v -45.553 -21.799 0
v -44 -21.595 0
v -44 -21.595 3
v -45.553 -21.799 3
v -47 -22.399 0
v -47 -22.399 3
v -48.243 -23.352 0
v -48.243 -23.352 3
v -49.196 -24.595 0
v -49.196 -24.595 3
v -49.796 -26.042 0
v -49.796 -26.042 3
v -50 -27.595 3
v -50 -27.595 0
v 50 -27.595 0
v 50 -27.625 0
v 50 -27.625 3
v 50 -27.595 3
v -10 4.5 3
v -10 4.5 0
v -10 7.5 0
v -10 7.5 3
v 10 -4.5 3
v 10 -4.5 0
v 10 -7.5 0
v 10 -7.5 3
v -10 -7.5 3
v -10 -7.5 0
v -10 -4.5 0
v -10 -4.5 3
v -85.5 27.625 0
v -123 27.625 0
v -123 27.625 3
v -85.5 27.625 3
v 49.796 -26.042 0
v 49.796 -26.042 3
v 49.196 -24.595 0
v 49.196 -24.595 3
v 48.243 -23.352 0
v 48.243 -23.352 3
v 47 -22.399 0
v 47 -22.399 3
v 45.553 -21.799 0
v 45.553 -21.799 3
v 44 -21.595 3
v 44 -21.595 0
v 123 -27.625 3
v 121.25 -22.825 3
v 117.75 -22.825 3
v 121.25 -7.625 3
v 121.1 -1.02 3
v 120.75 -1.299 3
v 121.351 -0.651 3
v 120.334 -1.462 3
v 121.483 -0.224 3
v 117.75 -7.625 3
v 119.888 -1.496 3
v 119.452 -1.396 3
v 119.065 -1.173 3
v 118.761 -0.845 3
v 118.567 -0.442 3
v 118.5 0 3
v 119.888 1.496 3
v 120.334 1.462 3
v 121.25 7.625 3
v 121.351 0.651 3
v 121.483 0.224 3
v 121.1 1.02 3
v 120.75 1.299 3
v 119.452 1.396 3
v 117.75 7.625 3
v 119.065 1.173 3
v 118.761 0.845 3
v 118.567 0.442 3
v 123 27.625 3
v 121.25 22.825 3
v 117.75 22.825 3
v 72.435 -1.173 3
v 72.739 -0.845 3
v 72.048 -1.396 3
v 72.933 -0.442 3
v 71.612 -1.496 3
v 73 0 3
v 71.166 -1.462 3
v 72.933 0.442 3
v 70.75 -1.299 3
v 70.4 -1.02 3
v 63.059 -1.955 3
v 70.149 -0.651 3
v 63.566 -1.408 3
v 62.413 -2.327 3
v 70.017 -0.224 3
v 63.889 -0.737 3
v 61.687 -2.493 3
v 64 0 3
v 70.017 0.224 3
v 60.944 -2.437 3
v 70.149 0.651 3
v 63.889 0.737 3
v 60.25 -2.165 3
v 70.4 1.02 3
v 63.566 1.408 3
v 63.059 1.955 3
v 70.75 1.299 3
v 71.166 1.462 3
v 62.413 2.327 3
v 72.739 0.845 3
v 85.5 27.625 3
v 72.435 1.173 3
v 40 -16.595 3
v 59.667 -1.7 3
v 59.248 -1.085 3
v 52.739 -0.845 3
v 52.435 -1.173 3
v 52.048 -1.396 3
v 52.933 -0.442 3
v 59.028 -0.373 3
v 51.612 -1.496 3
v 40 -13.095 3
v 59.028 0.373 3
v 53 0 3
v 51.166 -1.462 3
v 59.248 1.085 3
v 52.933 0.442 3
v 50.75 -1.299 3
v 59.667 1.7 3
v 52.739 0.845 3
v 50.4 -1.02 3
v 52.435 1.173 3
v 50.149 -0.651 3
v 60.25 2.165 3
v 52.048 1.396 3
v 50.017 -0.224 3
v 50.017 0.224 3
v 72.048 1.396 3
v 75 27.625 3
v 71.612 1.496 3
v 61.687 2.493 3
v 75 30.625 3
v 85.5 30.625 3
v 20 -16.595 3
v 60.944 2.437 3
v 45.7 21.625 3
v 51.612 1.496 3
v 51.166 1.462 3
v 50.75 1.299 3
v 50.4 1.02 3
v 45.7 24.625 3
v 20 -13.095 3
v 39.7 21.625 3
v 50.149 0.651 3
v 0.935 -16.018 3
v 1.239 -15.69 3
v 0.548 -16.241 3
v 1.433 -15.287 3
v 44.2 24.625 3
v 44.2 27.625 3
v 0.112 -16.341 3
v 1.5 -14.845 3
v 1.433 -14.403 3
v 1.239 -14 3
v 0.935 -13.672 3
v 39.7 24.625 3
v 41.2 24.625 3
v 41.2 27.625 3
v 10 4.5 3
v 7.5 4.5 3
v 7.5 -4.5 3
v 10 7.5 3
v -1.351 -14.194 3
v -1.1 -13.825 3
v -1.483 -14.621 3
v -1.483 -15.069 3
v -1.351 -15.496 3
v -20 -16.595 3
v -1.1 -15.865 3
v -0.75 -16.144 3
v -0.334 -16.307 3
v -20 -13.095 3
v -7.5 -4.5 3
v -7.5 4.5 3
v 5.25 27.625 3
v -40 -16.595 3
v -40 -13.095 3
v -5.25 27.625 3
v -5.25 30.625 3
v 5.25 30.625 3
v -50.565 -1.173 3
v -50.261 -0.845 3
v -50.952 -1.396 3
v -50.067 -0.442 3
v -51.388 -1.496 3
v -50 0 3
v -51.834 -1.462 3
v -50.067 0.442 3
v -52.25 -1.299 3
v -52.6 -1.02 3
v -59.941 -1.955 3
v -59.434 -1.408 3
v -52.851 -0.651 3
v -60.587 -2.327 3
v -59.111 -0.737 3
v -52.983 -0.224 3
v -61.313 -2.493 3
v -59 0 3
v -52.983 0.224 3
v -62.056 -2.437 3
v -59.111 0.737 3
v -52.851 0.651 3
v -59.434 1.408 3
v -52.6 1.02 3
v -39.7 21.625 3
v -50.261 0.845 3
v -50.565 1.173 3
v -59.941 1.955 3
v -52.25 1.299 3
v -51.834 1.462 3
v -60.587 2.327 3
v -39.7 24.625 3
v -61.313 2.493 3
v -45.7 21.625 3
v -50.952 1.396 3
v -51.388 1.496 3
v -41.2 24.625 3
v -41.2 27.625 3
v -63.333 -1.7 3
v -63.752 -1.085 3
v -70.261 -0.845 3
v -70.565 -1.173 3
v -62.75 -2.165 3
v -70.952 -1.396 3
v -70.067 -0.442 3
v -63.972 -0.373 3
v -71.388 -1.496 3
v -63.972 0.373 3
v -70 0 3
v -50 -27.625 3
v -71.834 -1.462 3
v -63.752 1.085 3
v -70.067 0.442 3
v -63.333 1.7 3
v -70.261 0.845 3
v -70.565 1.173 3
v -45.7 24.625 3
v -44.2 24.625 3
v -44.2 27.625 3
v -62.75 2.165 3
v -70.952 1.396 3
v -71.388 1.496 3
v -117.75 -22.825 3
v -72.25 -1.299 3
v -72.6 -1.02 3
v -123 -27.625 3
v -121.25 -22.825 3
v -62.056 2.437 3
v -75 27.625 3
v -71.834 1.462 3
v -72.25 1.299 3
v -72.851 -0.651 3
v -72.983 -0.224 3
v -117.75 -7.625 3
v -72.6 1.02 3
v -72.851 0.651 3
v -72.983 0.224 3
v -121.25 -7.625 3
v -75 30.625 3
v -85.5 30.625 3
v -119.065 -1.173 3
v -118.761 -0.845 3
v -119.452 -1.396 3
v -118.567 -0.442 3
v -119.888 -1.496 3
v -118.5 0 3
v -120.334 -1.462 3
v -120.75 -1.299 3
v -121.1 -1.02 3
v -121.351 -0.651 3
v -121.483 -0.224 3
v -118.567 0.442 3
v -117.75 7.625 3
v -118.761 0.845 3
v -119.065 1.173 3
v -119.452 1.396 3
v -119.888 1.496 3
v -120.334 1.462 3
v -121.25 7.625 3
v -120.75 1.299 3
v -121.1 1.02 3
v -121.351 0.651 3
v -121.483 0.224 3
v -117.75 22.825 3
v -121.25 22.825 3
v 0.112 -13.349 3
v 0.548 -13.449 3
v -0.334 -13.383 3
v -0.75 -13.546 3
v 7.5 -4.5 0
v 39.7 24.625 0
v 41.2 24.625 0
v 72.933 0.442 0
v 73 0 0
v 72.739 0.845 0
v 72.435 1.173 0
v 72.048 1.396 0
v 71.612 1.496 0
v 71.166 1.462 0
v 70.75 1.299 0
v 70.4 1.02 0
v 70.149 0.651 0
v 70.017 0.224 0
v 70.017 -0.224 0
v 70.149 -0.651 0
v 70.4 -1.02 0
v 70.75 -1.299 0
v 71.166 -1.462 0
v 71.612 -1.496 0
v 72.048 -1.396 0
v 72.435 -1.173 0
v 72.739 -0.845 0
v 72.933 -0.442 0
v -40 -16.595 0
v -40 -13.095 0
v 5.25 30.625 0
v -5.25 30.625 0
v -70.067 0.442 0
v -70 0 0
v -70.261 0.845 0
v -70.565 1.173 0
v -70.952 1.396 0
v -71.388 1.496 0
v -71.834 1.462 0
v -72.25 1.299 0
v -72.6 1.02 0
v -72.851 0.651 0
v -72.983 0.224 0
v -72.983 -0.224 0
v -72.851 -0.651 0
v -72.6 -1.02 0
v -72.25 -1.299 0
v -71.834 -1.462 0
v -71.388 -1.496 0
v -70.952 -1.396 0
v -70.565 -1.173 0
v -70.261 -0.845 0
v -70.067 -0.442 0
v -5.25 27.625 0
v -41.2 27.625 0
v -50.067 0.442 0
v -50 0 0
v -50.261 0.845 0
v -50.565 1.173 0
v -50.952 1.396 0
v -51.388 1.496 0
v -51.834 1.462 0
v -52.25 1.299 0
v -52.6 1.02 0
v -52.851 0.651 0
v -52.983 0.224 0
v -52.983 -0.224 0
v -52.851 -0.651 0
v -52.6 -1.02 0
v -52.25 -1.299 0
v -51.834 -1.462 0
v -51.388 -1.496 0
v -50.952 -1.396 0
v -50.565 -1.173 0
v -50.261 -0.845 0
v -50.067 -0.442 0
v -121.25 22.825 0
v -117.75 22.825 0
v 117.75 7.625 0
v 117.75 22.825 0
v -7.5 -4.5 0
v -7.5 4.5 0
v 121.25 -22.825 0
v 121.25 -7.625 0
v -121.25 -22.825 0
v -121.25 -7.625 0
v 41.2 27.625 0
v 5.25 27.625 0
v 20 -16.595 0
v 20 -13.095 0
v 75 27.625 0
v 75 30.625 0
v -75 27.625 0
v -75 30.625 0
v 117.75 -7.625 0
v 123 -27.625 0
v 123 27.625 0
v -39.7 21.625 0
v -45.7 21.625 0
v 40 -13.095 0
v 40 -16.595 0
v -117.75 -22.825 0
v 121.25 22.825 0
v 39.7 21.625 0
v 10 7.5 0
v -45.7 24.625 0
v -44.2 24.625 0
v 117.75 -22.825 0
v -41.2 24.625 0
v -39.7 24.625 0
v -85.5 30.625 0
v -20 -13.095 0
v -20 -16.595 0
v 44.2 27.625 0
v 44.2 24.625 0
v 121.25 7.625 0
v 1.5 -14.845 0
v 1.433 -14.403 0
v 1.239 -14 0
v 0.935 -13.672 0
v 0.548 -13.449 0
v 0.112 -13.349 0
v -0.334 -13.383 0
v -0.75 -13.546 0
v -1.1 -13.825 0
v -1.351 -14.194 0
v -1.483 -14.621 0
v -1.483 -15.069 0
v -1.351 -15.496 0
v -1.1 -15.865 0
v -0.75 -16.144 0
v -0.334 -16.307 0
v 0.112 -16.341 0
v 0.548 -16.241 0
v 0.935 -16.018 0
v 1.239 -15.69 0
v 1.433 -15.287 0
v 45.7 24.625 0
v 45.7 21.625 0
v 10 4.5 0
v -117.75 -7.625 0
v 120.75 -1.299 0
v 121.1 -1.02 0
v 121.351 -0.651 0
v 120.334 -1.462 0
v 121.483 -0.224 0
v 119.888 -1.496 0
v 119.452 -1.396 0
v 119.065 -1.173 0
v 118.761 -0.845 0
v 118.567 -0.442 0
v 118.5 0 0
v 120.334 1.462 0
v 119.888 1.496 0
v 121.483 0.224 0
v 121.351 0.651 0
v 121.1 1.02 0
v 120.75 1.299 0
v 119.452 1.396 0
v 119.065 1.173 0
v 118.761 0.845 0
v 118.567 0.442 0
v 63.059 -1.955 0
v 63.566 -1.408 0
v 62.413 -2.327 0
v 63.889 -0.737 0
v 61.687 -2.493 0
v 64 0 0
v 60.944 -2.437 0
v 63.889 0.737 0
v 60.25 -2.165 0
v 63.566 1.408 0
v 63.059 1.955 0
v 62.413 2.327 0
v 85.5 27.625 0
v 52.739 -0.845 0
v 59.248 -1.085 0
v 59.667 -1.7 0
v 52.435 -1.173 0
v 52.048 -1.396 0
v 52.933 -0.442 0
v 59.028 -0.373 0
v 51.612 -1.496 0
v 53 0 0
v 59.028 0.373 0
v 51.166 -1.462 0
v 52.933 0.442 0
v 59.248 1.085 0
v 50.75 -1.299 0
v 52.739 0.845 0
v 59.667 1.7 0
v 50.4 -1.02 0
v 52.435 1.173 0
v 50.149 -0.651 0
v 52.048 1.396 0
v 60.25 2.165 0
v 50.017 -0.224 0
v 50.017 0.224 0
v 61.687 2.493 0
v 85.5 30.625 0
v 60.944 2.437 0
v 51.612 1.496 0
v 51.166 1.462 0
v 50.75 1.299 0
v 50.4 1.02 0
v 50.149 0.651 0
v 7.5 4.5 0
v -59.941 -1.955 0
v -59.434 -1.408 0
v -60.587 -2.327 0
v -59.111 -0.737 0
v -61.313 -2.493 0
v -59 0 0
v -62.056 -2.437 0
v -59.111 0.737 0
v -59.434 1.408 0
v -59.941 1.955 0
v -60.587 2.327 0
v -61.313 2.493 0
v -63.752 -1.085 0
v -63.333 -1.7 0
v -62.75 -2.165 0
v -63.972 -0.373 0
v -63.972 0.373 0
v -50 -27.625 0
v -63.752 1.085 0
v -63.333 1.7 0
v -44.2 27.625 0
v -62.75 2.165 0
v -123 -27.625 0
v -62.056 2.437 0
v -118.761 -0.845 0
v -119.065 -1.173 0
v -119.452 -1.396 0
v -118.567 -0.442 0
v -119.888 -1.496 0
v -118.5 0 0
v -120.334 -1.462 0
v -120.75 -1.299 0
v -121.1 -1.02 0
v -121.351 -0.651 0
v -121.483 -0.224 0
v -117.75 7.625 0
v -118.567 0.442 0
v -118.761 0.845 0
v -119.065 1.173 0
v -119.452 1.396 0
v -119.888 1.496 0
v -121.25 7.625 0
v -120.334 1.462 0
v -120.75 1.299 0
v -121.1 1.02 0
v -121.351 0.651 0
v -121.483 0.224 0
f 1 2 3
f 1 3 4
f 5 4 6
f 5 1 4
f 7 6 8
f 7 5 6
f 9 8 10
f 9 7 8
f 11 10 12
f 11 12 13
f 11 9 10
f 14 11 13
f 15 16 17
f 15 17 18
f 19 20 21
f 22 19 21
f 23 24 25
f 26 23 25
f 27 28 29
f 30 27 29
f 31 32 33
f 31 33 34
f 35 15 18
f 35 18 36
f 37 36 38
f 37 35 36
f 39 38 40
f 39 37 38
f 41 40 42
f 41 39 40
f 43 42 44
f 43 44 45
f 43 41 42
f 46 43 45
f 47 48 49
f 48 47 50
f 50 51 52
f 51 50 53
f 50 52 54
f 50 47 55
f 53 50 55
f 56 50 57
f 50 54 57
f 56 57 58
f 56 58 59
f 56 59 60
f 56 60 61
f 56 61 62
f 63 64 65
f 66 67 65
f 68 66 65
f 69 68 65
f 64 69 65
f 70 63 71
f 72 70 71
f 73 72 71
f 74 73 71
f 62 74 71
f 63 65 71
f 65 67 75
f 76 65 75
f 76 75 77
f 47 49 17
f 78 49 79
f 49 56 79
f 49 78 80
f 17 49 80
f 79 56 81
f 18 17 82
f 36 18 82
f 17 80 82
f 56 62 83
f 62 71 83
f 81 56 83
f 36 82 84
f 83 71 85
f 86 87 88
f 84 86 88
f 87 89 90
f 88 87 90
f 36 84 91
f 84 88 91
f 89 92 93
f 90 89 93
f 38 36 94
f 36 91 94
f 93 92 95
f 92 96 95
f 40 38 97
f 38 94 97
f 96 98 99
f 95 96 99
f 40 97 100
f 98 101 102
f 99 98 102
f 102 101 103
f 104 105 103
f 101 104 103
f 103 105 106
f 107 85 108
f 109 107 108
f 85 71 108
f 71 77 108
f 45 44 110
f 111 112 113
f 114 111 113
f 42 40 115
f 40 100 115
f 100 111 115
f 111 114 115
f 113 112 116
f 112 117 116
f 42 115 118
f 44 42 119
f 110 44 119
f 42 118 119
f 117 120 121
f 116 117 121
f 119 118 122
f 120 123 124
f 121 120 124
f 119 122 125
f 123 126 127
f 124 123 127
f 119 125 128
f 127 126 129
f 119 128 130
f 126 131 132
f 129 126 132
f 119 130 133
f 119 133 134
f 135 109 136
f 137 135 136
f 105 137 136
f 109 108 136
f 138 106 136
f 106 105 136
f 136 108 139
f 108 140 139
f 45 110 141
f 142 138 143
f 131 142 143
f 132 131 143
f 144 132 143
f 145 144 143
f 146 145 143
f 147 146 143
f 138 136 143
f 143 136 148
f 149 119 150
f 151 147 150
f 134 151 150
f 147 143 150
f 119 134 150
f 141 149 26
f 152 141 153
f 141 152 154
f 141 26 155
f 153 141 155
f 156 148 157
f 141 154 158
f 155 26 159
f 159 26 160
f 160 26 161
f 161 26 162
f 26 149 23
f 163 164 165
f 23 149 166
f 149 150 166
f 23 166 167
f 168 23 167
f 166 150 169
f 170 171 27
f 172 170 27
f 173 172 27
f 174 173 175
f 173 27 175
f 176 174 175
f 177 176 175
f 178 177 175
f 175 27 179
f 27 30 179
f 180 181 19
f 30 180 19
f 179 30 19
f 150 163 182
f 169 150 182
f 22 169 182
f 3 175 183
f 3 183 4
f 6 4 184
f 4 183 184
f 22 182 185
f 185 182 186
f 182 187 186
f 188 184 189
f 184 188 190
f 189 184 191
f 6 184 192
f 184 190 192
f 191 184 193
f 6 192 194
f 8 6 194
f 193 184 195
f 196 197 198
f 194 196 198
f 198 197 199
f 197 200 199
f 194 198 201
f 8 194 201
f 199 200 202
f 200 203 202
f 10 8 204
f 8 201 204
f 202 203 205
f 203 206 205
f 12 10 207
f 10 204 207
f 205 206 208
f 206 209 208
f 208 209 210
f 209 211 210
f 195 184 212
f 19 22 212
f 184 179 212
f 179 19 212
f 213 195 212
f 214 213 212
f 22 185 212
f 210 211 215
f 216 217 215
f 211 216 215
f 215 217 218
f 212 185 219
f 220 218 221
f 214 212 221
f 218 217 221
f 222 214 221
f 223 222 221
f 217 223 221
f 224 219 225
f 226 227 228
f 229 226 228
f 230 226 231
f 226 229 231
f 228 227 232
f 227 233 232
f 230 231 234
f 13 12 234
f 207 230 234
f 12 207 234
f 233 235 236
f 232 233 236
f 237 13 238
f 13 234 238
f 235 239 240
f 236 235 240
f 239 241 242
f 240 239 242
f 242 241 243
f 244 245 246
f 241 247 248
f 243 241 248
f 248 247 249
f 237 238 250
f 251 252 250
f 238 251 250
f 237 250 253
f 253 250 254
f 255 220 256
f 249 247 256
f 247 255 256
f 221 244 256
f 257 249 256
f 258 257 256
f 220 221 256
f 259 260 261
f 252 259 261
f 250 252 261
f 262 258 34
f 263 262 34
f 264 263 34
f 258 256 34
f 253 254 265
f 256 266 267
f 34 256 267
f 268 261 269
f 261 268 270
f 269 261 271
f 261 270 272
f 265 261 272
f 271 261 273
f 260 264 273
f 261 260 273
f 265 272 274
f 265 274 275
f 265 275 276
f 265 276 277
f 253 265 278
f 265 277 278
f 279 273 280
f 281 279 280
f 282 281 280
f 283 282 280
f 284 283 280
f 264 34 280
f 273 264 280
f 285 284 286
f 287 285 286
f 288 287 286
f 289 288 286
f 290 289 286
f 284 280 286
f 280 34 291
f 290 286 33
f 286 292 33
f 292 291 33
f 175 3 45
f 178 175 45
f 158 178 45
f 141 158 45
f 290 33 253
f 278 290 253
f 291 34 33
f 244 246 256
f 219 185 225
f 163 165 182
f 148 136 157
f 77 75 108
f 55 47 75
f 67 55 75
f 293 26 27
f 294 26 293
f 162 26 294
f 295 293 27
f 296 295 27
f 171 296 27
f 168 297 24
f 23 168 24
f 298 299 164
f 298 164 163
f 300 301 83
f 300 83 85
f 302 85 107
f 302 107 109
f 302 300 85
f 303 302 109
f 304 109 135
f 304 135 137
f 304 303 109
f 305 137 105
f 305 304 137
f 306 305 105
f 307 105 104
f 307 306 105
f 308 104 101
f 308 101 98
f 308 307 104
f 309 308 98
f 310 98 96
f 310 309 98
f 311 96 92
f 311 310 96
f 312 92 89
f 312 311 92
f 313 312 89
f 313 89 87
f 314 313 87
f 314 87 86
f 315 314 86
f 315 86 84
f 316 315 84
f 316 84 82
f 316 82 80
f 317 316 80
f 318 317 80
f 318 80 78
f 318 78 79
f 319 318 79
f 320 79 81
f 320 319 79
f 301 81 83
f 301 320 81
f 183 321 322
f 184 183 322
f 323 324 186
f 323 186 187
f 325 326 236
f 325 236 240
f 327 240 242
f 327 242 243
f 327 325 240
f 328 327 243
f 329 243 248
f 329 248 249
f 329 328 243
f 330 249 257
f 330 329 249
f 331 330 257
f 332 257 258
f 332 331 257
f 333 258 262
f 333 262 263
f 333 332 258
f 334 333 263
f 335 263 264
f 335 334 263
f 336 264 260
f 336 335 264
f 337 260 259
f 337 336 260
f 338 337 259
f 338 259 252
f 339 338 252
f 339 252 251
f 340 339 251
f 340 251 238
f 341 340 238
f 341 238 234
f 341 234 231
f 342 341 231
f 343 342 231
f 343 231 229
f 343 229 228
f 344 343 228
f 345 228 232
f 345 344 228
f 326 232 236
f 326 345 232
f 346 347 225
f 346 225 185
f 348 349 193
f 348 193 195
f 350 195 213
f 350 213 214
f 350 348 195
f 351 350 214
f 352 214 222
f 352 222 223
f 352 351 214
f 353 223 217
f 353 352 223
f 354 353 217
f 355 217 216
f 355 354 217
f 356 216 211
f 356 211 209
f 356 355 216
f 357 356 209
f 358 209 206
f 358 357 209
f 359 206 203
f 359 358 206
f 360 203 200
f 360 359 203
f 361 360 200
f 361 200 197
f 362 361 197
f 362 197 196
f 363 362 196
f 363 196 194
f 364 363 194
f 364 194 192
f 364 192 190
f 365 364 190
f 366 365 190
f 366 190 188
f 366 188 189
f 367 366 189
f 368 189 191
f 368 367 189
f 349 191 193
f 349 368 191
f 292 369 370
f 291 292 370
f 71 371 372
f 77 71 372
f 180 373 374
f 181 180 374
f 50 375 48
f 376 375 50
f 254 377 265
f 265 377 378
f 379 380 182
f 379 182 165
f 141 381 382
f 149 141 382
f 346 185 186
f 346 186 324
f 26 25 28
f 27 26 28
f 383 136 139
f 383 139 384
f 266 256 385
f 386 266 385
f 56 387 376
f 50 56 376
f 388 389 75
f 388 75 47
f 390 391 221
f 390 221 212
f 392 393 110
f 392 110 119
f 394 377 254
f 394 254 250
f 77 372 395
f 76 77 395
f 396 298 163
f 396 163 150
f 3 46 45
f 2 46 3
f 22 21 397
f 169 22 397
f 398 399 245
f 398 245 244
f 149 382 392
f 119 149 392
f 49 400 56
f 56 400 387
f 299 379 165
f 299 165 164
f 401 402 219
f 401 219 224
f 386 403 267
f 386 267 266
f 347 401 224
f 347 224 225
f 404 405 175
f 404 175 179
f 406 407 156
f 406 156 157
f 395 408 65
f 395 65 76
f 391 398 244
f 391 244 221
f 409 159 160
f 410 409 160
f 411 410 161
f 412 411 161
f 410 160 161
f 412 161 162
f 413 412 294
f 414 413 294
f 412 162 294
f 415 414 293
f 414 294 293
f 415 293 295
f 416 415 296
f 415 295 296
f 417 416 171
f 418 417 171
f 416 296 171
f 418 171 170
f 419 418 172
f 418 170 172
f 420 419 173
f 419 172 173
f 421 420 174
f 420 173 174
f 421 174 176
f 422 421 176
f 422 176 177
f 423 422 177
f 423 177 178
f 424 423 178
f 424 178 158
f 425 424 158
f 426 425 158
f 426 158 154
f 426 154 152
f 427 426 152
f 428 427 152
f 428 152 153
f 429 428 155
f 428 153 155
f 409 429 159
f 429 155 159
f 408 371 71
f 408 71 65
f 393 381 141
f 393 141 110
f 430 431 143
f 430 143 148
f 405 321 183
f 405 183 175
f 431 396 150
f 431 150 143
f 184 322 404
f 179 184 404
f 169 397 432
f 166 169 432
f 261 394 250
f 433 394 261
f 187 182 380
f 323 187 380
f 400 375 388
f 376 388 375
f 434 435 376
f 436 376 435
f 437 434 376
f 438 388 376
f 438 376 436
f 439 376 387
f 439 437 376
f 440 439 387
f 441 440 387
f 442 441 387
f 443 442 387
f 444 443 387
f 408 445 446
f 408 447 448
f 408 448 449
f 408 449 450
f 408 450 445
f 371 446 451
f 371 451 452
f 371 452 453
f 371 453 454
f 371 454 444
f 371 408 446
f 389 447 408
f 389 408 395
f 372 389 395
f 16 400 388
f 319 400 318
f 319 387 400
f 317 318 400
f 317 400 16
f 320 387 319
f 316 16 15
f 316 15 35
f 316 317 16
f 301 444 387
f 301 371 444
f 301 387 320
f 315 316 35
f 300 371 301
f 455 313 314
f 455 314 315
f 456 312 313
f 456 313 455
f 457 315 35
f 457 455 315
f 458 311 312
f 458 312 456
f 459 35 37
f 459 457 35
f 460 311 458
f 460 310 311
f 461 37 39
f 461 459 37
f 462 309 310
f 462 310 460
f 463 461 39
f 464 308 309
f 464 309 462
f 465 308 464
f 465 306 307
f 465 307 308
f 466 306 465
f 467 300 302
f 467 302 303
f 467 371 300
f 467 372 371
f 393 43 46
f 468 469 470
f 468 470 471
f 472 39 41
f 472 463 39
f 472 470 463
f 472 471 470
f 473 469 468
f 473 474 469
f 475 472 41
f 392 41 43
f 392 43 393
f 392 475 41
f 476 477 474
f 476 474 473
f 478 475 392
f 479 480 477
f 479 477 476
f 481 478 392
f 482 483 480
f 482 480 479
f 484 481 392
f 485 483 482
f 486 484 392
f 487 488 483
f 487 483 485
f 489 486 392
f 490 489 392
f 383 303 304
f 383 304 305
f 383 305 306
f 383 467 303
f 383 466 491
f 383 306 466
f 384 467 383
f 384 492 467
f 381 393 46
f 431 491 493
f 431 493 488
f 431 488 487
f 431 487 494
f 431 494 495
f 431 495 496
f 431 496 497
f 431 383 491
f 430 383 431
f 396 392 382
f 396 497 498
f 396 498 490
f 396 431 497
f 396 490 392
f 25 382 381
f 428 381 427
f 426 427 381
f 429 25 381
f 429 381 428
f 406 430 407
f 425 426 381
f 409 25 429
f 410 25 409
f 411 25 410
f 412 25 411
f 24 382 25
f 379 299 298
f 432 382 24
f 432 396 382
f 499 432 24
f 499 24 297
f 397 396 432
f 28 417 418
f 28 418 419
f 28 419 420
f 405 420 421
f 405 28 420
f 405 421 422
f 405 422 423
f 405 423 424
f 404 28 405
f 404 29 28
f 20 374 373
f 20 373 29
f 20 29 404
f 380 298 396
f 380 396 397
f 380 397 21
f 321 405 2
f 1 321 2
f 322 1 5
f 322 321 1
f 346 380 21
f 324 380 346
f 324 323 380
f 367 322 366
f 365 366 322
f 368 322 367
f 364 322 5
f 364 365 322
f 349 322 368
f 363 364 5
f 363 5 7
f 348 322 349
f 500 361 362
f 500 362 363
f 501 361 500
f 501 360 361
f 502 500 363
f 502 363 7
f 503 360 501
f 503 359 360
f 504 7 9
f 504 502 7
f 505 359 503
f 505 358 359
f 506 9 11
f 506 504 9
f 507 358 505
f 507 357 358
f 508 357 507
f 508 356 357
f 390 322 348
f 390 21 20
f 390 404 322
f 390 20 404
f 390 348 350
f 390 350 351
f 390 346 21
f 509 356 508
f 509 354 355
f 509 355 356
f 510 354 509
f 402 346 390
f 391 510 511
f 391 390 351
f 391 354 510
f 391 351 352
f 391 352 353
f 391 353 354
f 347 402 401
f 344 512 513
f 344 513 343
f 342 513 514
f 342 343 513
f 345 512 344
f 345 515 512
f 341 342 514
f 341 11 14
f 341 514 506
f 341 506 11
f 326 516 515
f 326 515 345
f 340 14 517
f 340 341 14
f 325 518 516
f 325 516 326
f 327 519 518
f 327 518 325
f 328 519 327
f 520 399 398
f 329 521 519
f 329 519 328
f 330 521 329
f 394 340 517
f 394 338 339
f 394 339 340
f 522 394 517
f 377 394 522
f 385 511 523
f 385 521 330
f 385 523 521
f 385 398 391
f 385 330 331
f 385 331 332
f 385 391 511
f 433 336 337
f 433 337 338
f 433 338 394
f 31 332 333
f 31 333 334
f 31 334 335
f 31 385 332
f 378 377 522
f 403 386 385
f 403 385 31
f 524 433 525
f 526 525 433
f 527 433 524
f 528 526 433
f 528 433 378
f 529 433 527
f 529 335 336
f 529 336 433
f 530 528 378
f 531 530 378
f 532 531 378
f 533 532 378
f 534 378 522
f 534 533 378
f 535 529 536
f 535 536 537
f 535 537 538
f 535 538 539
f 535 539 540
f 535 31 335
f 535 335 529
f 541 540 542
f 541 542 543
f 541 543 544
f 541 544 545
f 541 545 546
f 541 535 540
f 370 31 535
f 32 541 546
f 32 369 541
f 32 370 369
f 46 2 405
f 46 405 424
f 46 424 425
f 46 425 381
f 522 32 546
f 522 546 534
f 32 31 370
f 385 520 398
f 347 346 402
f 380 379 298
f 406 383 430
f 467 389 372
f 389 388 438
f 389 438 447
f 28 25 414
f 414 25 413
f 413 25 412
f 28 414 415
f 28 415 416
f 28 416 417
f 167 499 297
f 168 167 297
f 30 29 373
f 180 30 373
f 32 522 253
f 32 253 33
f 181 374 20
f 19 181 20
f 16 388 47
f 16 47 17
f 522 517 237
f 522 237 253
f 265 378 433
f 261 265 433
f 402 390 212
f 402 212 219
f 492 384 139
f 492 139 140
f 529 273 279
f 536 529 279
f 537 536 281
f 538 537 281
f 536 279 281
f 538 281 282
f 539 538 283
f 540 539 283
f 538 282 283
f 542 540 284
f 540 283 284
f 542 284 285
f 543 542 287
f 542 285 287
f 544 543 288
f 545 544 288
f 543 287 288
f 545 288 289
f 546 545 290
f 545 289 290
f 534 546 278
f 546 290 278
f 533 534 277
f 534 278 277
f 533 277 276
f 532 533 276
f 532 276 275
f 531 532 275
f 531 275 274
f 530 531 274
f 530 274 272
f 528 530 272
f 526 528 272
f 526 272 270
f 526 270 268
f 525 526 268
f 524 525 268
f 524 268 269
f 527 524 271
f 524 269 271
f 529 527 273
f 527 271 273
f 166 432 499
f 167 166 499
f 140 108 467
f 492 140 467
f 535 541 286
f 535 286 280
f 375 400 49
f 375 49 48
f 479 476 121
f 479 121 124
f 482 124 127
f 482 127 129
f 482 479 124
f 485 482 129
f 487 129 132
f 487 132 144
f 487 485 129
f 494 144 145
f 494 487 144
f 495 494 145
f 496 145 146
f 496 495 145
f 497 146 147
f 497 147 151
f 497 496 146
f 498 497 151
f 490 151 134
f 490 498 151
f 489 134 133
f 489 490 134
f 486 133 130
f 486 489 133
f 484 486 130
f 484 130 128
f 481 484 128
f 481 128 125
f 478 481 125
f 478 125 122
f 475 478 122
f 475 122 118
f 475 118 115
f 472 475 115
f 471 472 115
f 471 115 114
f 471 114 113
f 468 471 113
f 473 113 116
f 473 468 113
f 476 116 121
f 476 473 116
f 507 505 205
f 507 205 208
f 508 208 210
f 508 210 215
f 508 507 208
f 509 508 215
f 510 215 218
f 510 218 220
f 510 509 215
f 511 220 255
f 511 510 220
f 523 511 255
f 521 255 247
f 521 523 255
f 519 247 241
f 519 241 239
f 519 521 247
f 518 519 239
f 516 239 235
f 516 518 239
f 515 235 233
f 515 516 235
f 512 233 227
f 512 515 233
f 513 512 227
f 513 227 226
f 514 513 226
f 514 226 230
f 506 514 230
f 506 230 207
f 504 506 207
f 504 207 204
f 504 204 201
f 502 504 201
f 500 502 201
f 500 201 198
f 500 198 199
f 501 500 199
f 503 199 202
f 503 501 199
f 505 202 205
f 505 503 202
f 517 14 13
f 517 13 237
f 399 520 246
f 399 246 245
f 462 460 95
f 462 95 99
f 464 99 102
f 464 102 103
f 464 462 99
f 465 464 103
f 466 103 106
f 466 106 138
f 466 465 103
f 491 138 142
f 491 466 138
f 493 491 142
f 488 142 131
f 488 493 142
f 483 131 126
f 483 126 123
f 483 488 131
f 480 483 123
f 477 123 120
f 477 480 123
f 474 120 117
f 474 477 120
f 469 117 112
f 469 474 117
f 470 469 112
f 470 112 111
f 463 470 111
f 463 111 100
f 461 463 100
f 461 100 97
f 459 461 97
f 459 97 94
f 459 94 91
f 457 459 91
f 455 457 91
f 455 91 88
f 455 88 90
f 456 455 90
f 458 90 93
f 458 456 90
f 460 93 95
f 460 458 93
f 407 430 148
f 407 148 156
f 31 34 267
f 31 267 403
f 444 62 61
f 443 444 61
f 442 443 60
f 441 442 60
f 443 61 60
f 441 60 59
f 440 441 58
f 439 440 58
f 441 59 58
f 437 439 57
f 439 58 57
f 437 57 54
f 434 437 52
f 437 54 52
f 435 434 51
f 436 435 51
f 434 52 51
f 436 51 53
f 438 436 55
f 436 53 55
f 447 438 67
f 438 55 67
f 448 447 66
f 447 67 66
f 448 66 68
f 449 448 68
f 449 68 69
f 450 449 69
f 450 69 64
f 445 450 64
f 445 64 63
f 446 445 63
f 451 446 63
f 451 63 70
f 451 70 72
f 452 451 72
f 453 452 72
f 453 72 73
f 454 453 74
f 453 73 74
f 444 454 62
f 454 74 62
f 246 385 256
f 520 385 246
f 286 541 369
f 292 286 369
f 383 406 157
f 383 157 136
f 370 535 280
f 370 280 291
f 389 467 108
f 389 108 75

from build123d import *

# Parameters (mm, degrees)
CROQUIS1_R              = 2.5
CROQUIS1_R_2            = 1.5
CROQUIS1_W              = 20
CROQUIS1_H              = 3.5
CROQUIS1_W_2            = 3.5
CROQUIS1_H_2            = 15.2
SALIENTE_EXTRUIR1_DEPTH = 3
CROQUIS2_W              = 10.5
CROQUIS2_H              = 3
SALIENTE_EXTRUIR2_DEPTH = 3
CROQUIS3_R              = 1.5
CORTAR_EXTRUIR1_DEPTH   = 3
CROQUIS4_R              = 1.5
CORTAR_EXTRUIR2_DEPTH   = 3


with BuildPart() as part:
    # Croquis1 → Saliente-Extruir1 (new body)
    with BuildSketch(Plane.XY):
        with BuildLine():
            Line((123, -27.625), (50, -27.625))
            Line((50, -27.625), (50, -27.595))
            ThreePointArc((50, -27.595), (48.242640687, -23.352359313), (44, -21.595))
            Line((44, -21.595), (-44, -21.595))
            ThreePointArc((-44, -21.595), (-48.242640687, -23.352359313), (-50, -27.595))
            Line((-50, -27.595), (-50, -27.625))
            Line((-50, -27.625), (-123, -27.625))
            Line((-123, -27.625), (-123, 27.625))
            Line((-123, 27.625), (-44.2, 27.625))
            Line((-44.2, 27.625), (-44.2, 24.625))
            Line((-44.2, 24.625), (-45.7, 24.625))
            Line((-45.7, 24.625), (-45.7, 21.625))
            Line((-45.7, 21.625), (-39.7, 21.625))
            Line((-39.7, 21.625), (-39.7, 24.625))
            Line((-39.7, 24.625), (-41.2, 24.625))
            Line((-41.2, 24.625), (-41.2, 27.625))
            Line((-41.2, 27.625), (41.2, 27.625))
            Line((41.2, 27.625), (41.2, 24.625))
            Line((41.2, 24.625), (39.7, 24.625))
            Line((39.7, 24.625), (39.7, 21.625))
            Line((39.7, 21.625), (45.7, 21.625))
            Line((45.7, 21.625), (45.7, 24.625))
            Line((45.7, 24.625), (44.2, 24.625))
            Line((44.2, 24.625), (44.2, 27.625))
            Line((44.2, 27.625), (123, 27.625))
            Line((123, 27.625), (123, -27.625))
        make_face()
        with Locations((61.5, 0)):
            Circle(CROQUIS1_R, mode=Mode.SUBTRACT)
        with Locations((71.5, 0)):
            Circle(CROQUIS1_R_2, mode=Mode.SUBTRACT)
        with Locations((51.5, 0)):
            Circle(CROQUIS1_R_2, mode=Mode.SUBTRACT)
        with Locations((-71.5, 0)):
            Circle(CROQUIS1_R_2, mode=Mode.SUBTRACT)
        with Locations((-61.5, 0)):
            Circle(CROQUIS1_R, mode=Mode.SUBTRACT)
        with Locations((-51.5, 0)):
            Circle(CROQUIS1_R_2, mode=Mode.SUBTRACT)
        Polygon((-10, 7.5), (10, 7.5), (10, 4.5), (7.5, 4.5), (7.5, -4.5), (10, -4.5), (10, -7.5), (-10, -7.5), (-10, -4.5), (-7.5, -4.5), (-7.5, 4.5), (-10, 4.5), align=None, mode=Mode.SUBTRACT)
        with Locations((30, -14.845)):
            Rectangle(CROQUIS1_W, CROQUIS1_H, mode=Mode.SUBTRACT)
        with Locations((119.5, 15.225)):
            Rectangle(CROQUIS1_W_2, CROQUIS1_H_2, mode=Mode.SUBTRACT)
        with Locations((119.5, -15.225)):
            Rectangle(CROQUIS1_W_2, CROQUIS1_H_2, mode=Mode.SUBTRACT)
        with Locations((-119.5, 15.225)):
            Rectangle(CROQUIS1_W_2, CROQUIS1_H_2, mode=Mode.SUBTRACT)
        with Locations((-119.5, -15.225)):
            Rectangle(CROQUIS1_W_2, CROQUIS1_H_2, mode=Mode.SUBTRACT)
        with Locations((-30, -14.845)):
            Rectangle(CROQUIS1_W, CROQUIS1_H, mode=Mode.SUBTRACT)
    extrude(amount=SALIENTE_EXTRUIR1_DEPTH)

    # Croquis2 → Saliente-Extruir2 (add)
    with BuildSketch(Plane(origin=(0, 27.625, 0), x_dir=(1, 0, 0), z_dir=(0, 1, 0))):
        with Locations((0, -1.5)):
            Rectangle(CROQUIS2_W, CROQUIS2_H)
        with Locations((80.25, -1.5)):
            Rectangle(CROQUIS2_W, CROQUIS2_H)
        with Locations((-80.25, -1.5)):
            Rectangle(CROQUIS2_W, CROQUIS2_H)
    extrude(amount=SALIENTE_EXTRUIR2_DEPTH)

    # Croquis3 → Cortar-Extruir1 (cut)
    with BuildSketch(Plane.XY.offset(3)):
        with Locations((-120, 0)):
            Circle(CROQUIS3_R)
        with Locations(Location((120, 0, 0), (0, 0, 180))):
            Circle(CROQUIS3_R)
    extrude(amount=-CORTAR_EXTRUIR1_DEPTH, mode=Mode.SUBTRACT)

    # Croquis4 → Cortar-Extruir2 (cut)
    with BuildSketch(Plane.XY.offset(3)):
        with Locations((0, -14.845)):
            Circle(CROQUIS4_R)
    extrude(amount=-CORTAR_EXTRUIR2_DEPTH, mode=Mode.SUBTRACT)


solid = part.part
